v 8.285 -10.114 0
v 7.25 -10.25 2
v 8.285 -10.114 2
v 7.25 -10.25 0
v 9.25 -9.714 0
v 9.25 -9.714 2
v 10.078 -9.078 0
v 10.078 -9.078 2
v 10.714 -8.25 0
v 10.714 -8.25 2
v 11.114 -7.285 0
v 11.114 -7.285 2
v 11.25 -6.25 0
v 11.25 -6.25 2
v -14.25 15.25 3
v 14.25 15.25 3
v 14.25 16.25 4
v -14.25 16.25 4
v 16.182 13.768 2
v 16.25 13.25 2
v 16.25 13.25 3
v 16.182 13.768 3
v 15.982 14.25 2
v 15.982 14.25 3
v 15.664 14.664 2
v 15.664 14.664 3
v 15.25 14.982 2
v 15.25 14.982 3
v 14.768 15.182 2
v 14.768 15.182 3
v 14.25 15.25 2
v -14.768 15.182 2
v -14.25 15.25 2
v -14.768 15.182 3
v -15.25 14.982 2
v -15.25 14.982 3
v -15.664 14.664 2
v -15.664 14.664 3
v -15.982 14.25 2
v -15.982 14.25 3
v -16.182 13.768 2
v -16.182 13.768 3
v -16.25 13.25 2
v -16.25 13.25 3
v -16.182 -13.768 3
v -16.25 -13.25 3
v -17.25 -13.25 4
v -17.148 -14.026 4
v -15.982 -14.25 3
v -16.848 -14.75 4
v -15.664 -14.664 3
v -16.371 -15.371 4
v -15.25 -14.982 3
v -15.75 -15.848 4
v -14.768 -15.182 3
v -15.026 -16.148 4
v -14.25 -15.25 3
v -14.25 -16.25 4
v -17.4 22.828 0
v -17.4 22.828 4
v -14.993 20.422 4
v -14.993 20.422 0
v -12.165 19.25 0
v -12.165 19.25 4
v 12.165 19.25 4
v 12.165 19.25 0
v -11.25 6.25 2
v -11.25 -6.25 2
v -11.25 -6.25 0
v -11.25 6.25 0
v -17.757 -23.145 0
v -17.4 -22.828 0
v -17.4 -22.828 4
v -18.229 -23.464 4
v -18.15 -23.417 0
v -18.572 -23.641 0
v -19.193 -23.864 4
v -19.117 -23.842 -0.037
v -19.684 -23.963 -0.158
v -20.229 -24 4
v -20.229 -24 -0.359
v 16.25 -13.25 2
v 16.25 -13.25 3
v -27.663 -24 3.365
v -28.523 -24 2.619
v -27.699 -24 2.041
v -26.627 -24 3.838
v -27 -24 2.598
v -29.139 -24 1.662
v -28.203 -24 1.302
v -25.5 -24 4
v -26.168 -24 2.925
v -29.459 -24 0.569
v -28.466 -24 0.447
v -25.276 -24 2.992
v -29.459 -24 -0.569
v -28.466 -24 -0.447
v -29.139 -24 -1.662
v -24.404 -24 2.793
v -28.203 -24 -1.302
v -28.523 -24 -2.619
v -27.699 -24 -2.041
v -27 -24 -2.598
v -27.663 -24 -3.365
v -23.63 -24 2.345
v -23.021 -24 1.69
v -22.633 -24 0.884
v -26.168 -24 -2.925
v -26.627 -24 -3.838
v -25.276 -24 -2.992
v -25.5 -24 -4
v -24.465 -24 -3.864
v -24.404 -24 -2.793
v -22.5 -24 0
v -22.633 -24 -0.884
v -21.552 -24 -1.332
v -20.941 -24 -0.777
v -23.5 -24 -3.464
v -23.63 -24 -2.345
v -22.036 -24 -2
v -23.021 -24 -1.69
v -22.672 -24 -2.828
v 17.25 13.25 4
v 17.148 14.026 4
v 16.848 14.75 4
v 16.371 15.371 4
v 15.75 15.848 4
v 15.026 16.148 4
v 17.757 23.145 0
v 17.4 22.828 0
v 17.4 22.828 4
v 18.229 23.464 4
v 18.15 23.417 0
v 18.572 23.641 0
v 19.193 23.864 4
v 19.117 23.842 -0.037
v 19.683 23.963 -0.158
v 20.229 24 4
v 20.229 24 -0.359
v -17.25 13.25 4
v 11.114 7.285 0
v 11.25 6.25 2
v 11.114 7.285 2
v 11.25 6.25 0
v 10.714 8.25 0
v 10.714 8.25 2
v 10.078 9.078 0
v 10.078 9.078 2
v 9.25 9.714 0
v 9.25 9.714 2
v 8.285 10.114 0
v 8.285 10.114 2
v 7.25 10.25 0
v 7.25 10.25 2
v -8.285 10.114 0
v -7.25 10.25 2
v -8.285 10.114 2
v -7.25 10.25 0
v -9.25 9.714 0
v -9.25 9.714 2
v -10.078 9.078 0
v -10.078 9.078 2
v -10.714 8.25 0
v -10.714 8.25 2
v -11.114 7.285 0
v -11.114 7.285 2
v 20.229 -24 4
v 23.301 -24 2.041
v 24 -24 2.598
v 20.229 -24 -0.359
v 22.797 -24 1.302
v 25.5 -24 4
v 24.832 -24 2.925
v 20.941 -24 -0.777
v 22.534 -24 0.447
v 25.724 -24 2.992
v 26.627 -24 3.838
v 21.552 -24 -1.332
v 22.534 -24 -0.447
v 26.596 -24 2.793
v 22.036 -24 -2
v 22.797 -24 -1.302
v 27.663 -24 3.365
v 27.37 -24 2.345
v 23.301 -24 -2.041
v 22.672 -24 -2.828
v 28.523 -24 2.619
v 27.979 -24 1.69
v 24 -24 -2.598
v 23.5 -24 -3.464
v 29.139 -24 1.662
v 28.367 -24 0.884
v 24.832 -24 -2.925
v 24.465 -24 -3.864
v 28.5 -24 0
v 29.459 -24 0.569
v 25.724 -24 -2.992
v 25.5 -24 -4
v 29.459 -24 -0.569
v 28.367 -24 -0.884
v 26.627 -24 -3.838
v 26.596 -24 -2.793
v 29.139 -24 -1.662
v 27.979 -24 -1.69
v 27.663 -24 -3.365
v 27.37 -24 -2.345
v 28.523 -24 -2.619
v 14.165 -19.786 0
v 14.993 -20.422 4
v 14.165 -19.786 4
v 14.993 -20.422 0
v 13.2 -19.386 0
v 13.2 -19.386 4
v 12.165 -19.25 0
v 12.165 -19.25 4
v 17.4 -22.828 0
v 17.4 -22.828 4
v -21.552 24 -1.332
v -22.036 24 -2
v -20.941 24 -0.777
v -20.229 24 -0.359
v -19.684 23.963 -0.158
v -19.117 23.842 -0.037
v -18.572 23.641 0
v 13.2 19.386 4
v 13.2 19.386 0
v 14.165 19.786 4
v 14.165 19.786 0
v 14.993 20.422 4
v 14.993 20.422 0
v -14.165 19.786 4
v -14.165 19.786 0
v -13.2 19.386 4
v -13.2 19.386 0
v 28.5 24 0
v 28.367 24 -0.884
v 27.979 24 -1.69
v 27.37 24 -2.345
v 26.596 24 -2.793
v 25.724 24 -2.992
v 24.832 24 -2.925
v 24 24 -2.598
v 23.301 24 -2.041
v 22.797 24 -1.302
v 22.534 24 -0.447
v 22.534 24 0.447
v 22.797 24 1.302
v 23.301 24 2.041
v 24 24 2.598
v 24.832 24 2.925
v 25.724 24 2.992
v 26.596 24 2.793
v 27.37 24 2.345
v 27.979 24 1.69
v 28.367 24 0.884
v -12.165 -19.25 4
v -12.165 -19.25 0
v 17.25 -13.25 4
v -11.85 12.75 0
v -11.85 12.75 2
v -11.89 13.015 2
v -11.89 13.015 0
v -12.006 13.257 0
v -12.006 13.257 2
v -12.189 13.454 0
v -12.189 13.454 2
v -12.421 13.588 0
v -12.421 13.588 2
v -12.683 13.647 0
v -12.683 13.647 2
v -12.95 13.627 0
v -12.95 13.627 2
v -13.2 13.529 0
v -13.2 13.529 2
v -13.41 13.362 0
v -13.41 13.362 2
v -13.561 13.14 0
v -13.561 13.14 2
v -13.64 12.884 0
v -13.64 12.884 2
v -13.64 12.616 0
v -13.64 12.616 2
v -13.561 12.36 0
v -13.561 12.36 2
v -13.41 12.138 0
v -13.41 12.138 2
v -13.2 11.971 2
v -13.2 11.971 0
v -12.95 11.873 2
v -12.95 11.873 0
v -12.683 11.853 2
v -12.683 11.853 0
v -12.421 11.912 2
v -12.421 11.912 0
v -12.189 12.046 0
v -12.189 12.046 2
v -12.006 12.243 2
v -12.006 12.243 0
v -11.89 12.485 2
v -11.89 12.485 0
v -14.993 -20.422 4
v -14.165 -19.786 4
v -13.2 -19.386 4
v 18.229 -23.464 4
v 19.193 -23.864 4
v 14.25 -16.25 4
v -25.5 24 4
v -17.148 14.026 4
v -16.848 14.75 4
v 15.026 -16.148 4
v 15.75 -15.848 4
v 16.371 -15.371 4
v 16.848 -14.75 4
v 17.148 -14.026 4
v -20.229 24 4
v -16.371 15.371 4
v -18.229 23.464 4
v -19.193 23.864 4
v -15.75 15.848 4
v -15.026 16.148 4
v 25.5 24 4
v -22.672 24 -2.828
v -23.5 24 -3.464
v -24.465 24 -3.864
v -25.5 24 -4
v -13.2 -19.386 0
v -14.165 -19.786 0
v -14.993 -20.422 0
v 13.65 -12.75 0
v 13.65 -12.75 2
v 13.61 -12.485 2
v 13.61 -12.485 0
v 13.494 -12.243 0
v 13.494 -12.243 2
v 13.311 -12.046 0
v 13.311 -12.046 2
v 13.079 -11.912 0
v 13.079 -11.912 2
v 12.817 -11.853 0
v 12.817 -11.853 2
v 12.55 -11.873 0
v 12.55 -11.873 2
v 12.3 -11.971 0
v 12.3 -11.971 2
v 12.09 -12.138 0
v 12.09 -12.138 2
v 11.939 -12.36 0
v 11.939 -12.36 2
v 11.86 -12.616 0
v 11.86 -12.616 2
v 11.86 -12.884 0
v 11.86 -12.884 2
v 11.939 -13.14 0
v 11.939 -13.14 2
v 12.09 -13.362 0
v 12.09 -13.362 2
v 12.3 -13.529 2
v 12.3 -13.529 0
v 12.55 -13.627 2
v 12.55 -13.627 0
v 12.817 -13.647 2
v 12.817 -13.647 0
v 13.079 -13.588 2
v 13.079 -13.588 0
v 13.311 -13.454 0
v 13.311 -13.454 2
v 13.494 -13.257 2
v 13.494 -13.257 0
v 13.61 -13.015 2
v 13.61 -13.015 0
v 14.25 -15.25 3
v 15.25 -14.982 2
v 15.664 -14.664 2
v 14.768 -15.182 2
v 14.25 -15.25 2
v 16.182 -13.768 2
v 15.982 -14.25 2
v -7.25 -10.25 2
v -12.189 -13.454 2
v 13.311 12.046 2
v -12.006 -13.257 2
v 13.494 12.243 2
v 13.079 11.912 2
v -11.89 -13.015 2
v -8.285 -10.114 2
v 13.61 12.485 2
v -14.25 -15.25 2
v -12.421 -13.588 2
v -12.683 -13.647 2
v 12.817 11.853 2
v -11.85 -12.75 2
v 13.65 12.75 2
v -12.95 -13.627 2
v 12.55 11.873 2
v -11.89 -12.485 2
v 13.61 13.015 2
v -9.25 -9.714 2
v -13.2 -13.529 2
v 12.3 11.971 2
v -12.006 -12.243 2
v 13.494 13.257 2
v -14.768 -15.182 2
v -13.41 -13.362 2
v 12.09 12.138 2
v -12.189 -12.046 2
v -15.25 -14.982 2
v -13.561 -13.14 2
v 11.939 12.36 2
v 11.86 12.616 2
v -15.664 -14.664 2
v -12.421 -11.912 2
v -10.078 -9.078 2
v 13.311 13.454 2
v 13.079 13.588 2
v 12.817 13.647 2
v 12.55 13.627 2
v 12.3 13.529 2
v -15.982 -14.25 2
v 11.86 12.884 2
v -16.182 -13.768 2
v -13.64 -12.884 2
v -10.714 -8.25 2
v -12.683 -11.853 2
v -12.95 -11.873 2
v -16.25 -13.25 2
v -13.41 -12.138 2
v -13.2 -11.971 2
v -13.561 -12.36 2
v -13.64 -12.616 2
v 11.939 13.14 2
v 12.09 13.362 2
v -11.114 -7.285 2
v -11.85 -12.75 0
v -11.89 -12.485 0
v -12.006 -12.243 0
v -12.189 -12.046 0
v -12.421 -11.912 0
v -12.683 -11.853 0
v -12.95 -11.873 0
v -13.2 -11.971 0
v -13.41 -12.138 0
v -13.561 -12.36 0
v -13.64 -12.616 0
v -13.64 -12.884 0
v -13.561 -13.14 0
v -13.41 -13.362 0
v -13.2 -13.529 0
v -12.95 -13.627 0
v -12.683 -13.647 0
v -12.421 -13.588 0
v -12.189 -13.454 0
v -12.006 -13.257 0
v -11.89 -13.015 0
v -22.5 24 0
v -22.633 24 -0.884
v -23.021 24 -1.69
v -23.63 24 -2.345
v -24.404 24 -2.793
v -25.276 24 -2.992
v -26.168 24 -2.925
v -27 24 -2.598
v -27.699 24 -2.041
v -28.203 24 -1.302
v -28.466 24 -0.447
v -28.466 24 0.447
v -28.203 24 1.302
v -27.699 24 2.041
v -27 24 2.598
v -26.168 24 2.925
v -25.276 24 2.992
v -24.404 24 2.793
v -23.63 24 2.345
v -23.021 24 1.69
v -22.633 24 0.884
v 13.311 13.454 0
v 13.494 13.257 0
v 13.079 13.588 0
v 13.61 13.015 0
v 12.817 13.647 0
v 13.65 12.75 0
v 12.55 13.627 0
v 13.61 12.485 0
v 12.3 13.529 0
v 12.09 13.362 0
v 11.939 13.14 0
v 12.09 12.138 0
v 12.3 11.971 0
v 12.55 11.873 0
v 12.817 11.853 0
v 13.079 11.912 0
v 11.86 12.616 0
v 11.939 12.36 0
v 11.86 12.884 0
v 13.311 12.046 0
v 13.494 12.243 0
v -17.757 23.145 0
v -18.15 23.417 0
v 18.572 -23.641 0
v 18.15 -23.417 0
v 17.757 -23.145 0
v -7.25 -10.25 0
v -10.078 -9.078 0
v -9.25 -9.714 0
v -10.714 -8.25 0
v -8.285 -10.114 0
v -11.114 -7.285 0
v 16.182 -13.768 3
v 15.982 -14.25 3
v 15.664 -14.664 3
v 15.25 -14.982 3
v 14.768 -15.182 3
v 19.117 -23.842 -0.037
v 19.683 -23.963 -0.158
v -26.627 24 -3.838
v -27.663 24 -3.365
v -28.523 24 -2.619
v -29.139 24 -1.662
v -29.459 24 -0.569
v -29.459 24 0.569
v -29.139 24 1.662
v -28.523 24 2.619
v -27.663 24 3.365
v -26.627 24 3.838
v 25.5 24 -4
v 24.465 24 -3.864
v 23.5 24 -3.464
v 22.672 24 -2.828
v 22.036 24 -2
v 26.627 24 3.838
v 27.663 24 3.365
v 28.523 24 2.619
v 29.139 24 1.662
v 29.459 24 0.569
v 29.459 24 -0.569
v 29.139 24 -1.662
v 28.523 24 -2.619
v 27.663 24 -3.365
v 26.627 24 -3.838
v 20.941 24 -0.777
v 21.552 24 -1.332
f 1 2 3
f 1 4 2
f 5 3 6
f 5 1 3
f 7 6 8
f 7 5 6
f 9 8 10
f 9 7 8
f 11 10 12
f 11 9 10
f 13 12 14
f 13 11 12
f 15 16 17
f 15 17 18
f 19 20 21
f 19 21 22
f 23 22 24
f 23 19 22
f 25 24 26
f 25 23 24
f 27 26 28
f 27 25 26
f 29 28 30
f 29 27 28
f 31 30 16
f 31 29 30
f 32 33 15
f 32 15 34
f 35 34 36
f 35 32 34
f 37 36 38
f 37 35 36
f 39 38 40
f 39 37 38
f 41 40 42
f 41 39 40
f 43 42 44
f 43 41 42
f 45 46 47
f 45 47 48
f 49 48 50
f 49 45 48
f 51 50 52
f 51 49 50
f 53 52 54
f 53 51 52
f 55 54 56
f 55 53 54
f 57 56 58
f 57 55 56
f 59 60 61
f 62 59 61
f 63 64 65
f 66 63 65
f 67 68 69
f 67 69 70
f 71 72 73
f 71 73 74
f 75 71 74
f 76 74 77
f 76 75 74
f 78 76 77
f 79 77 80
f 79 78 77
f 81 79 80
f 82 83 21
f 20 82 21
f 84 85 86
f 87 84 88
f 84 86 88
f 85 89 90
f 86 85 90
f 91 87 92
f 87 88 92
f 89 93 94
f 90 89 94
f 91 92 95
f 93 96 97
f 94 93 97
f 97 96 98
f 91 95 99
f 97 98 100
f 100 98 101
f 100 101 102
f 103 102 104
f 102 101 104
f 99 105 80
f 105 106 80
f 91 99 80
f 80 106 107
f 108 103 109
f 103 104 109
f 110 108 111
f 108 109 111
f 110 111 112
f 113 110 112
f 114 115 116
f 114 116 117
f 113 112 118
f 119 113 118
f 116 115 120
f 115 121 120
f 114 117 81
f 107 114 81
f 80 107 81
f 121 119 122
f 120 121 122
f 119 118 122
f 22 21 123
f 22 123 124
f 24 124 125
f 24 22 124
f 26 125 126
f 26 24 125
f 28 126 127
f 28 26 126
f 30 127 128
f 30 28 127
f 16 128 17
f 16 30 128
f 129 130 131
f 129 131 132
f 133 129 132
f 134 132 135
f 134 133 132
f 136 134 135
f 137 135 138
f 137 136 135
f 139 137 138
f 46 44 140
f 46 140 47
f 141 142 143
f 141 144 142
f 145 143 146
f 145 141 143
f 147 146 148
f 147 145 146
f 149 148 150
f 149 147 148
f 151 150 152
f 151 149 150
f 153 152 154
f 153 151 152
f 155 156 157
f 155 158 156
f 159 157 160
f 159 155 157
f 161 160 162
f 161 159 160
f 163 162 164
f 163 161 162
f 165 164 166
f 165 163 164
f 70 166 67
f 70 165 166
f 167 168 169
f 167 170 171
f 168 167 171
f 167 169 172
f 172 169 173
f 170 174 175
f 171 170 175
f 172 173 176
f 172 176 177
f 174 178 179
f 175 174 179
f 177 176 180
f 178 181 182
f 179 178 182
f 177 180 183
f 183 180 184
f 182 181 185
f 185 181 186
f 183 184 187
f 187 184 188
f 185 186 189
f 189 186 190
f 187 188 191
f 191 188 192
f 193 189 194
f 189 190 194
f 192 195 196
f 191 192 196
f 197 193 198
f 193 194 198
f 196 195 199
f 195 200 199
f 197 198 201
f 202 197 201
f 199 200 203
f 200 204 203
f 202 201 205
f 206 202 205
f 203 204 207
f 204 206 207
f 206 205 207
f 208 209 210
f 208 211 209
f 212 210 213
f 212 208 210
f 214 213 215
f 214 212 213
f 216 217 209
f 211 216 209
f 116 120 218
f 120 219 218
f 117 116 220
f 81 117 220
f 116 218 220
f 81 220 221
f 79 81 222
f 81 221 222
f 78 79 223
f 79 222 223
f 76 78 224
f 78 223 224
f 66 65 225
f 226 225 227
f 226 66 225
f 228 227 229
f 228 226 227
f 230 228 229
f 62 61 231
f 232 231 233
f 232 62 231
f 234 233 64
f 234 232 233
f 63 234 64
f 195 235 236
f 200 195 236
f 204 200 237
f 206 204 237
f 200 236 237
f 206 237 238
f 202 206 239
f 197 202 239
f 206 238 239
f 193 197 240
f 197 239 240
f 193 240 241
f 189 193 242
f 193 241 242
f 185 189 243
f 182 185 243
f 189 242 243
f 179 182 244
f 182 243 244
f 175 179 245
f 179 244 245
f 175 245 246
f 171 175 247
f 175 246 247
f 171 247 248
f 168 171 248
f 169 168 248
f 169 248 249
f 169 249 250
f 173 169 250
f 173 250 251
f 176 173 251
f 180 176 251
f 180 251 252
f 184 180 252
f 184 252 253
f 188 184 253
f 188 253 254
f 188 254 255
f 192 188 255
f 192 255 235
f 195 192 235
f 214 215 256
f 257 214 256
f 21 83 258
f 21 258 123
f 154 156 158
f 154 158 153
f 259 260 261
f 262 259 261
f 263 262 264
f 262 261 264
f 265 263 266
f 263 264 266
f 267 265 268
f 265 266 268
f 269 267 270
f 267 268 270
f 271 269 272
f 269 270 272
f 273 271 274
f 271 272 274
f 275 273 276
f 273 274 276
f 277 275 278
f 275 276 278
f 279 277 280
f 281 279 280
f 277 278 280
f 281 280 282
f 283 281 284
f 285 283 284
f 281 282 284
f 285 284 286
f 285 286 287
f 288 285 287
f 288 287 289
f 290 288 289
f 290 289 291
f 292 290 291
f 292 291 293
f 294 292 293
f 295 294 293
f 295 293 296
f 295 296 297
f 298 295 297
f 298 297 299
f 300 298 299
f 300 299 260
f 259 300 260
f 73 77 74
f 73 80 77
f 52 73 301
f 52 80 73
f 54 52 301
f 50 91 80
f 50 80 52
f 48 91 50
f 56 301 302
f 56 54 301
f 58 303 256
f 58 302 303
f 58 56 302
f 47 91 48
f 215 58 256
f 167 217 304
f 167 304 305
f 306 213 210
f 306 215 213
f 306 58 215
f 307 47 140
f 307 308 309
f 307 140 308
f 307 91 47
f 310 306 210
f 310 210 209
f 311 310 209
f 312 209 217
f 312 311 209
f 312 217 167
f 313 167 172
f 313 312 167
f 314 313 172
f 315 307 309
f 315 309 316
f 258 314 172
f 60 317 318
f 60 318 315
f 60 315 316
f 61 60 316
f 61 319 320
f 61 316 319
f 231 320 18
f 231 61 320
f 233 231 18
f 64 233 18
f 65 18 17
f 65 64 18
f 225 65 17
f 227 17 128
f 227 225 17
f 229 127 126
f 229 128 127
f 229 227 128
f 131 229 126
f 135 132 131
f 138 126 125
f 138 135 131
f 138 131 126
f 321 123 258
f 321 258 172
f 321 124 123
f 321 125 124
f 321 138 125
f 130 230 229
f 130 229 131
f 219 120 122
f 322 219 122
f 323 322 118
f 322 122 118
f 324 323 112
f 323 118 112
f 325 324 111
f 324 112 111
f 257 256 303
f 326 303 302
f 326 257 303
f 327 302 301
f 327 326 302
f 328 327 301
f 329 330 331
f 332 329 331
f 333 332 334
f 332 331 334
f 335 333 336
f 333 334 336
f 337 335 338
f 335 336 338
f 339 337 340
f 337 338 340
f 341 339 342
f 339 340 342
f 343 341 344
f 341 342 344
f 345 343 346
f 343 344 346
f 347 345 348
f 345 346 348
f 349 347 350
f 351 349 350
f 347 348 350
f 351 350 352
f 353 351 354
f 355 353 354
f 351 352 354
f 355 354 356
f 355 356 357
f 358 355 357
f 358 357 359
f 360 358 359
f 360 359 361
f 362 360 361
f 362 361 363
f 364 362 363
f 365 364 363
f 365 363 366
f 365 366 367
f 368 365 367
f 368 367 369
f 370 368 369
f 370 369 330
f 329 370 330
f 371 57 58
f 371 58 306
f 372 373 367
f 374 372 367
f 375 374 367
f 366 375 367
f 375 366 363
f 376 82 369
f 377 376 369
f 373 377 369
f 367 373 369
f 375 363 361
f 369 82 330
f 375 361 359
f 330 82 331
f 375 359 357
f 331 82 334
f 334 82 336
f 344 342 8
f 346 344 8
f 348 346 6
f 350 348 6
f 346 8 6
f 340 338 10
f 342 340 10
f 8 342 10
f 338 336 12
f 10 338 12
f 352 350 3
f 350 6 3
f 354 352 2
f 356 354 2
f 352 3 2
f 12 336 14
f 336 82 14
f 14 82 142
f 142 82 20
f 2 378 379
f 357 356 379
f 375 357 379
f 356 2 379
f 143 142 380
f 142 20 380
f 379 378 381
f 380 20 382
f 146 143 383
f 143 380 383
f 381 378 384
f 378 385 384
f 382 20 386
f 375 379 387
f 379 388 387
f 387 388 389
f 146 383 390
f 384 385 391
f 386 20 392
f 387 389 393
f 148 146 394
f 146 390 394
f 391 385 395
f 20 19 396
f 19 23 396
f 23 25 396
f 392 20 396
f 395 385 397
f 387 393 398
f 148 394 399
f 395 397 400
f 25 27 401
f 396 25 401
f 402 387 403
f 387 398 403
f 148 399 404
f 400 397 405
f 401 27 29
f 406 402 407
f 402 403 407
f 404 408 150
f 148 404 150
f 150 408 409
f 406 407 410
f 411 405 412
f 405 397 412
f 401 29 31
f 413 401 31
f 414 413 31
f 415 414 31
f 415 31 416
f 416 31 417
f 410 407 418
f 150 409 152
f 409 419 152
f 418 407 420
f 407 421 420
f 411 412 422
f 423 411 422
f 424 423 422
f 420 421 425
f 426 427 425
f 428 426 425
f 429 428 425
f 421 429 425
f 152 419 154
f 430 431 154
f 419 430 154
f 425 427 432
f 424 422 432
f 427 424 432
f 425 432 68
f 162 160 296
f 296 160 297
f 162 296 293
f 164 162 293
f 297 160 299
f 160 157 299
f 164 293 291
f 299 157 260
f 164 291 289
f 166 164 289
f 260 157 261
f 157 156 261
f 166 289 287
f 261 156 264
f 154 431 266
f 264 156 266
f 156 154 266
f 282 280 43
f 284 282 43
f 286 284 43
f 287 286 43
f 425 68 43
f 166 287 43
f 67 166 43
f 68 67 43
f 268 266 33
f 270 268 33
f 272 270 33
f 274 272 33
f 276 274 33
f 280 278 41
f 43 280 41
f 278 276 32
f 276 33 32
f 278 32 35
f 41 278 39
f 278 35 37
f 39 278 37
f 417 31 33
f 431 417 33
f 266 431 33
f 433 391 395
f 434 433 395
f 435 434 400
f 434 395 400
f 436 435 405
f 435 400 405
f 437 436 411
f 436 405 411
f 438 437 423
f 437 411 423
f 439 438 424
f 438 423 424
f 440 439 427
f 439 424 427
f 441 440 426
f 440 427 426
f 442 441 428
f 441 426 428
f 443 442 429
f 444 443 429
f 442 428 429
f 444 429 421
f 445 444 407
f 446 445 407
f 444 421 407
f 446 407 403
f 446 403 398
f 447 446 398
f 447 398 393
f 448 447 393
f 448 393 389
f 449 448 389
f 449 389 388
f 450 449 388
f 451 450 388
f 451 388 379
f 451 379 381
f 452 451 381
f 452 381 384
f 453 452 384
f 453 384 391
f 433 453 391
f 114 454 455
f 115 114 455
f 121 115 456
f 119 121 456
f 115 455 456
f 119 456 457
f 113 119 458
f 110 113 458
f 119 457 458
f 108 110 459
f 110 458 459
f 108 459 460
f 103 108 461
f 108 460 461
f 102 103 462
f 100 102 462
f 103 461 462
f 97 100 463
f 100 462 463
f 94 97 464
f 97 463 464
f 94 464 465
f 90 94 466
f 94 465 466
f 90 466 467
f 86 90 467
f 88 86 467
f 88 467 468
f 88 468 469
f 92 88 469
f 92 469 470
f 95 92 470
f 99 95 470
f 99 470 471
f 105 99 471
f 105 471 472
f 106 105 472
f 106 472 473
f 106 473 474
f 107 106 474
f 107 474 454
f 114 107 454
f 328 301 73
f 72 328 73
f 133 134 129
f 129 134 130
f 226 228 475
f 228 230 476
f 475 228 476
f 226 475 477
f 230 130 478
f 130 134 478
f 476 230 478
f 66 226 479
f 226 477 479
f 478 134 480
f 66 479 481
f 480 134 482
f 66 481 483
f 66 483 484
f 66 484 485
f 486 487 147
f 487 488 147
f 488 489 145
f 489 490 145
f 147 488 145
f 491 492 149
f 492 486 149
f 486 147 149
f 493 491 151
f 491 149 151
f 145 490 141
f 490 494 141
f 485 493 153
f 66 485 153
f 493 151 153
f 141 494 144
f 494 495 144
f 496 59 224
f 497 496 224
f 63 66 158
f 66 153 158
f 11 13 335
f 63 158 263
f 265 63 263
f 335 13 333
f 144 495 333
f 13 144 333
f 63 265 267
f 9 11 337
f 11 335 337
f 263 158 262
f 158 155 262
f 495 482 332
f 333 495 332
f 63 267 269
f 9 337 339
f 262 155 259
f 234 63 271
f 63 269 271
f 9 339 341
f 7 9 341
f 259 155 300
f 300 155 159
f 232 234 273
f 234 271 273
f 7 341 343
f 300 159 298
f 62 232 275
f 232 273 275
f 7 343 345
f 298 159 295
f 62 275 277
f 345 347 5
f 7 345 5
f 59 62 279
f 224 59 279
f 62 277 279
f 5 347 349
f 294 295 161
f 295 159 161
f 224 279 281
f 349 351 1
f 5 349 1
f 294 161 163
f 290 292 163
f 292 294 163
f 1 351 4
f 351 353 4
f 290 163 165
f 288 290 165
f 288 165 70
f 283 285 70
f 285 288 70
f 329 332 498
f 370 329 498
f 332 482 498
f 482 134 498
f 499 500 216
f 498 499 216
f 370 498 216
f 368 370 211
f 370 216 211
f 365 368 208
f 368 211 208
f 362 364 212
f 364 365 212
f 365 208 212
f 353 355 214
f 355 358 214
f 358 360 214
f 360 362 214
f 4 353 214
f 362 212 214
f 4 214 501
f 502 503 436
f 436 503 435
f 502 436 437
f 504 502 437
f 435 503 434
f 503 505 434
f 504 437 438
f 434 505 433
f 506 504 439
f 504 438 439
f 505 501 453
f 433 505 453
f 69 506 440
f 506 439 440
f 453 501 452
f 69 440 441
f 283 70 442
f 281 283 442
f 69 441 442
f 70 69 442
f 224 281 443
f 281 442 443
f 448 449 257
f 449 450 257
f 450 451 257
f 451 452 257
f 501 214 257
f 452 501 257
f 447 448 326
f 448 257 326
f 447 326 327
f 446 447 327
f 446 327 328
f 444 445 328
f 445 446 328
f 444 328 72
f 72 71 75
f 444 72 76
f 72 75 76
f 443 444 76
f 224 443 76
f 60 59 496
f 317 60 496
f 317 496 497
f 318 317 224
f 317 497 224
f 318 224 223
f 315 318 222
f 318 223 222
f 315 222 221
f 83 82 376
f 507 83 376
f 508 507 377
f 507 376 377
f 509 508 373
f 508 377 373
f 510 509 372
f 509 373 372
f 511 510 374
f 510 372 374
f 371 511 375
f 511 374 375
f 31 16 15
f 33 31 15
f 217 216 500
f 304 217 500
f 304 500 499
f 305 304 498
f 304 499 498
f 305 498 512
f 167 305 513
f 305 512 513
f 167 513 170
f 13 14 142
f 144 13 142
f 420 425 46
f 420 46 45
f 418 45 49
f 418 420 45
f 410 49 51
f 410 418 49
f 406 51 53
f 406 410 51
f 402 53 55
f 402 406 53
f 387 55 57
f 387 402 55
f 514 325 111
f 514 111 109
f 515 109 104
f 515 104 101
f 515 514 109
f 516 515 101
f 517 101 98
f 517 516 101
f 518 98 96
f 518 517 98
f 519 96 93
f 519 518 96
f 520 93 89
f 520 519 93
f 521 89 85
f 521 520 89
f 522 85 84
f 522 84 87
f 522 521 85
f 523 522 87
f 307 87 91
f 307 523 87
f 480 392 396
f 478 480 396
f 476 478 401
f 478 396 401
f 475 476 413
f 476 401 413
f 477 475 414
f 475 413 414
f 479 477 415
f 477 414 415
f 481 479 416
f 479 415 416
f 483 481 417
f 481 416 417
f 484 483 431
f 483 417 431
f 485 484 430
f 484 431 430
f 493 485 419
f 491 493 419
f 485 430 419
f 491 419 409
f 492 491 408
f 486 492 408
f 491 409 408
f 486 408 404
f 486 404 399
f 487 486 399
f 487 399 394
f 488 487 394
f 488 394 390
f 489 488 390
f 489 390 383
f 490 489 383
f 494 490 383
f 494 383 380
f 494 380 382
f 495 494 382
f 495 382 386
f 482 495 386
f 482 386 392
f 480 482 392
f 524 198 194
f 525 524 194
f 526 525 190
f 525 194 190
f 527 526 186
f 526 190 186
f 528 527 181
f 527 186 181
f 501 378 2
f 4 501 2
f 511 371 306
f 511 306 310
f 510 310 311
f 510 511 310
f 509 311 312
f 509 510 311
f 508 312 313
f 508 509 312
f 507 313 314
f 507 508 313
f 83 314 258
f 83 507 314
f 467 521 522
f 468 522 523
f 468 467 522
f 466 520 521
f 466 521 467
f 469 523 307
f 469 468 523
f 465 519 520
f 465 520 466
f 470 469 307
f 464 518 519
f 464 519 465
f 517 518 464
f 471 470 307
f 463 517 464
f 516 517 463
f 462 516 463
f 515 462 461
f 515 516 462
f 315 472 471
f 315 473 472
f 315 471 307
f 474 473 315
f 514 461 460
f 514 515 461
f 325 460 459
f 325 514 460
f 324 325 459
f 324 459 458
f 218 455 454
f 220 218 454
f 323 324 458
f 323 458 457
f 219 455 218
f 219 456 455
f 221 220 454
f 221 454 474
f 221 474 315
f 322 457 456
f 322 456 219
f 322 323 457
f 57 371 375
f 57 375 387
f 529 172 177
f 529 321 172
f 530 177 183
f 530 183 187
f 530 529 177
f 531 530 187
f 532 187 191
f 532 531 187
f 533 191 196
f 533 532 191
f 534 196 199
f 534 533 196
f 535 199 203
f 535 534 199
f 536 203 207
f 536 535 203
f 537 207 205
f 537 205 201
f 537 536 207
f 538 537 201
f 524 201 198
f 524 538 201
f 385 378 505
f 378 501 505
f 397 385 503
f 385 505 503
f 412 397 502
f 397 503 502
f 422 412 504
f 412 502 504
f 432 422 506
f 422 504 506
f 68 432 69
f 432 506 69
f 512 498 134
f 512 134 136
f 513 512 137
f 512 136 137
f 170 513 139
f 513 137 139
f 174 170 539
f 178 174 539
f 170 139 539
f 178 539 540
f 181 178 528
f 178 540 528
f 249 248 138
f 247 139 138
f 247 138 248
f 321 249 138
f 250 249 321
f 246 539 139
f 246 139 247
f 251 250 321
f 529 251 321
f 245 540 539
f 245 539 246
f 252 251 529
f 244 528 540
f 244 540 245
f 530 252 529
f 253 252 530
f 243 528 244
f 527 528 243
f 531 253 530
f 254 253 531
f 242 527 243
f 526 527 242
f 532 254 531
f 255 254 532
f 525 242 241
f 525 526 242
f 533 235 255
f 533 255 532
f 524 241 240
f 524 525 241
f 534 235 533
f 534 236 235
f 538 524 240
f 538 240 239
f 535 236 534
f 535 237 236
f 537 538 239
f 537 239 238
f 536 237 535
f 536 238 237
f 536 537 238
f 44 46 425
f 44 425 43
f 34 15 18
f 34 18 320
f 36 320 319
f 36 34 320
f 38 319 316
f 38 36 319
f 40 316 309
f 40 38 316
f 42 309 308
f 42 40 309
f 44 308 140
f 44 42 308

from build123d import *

# Parameters (mm, degrees)
BOSS_EXTRUDE1_DEPTH    = 24
F_6_0MM_DOWEL_HOLE1_D  = 6
SKETCH4_W              = 32.5
SKETCH4_H              = 30.5
CUT_EXTRUDE1_DEPTH     = 2
FILLET1_R              = 2
CUT_EXTRUDE2_DEPTH     = 57.482298112
FILLET2_R              = 4
SKETCH6_W              = 22.5
SKETCH6_H              = 20.5
CUT_EXTRUDE5_DEPTH     = 39.861935104
FILLET3_R              = 4
CUT_EXTRUDE6_DEPTH     = 39.861935104
FILLET4_R              = 4
M1_6_CLEARANCE_HOLE1_D = 1.8
CHAMFER1_SIZE          = 1


with BuildPart() as part:
    # Sketch1 → Boss-Extrude1 (new, symmetric)
    with BuildSketch(Plane(origin=(0, 0, 0), x_dir=(1, 0, 0), z_dir=(0, 1, 0))):
        with BuildLine():
            Line((25.5, 4), (-25.5, 4))
            ThreePointArc((-25.5, 4), (-29.5, 0), (-25.5, -4))
            Line((-25.5, -4), (25.5, -4))
            ThreePointArc((25.5, -4), (29.5, 0), (25.5, 4))
        make_face()
    extrude(amount=BOSS_EXTRUDE1_DEPTH, both=True)

    # Ø6.0mm Dowel Hole1 (through all)
    with Locations(Plane(origin=(0, -24, 0), x_dir=(-1, 0, 0), z_dir=(0, -1, 0))):
        with Locations((25.5, 0), (-25.5, 0)):
            Hole(F_6_0MM_DOWEL_HOLE1_D / 2)

    # Sketch4 → Cut-Extrude1 (cut)
    with BuildSketch(Plane(origin=(0, 0, 4), x_dir=(-1, 0, 0), z_dir=(0, 0, -1))):
        Rectangle(SKETCH4_W, SKETCH4_H)
    extrude(amount=CUT_EXTRUDE1_DEPTH, mode=Mode.SUBTRACT)

    # Fillet1
    fillet1_edges = [part.edges().sort_by_distance(p)[0] for p in [
        (-16.25, 15.25, 3),
        (16.25, 15.25, 3),
        (16.25, -15.25, 3),
        (-16.25, -15.25, 3),
    ]]
    fillet(fillet1_edges, radius=FILLET1_R)

    # Sketch5 → Cut-Extrude2 (cut, through all)
    with BuildSketch(Plane.XZ.offset(24)):
        with BuildLine():
            Line((21.5, 0), (-21.5, 0))
            ThreePointArc((-21.5, 0), (-22.671572875, -2.828427125), (-25.5, -4))
            Line((-25.5, -4), (25.5, -4))
            ThreePointArc((25.5, -4), (22.671572875, -2.828427125), (21.5, 0))
        make_face()
    extrude(amount=-CUT_EXTRUDE2_DEPTH, mode=Mode.SUBTRACT)

    # Fillet2
    fillet2_edges = [part.edges().sort_by_distance(p)[0] for p in [
        (21.5, 0, 0),
        (-21.5, 0, 0),
    ]]
    fillet(fillet2_edges, radius=FILLET2_R)

    # Sketch6 → Cut-Extrude5 (cut, through all)
    with BuildSketch(Plane.XY.offset(4)):
        Rectangle(SKETCH6_W, SKETCH6_H)
    extrude(amount=-CUT_EXTRUDE5_DEPTH, mode=Mode.SUBTRACT)

    # Fillet3
    fillet3_edges = [part.edges().sort_by_distance(p)[0] for p in [
        (11.25, -10.25, 1),
        (-11.25, -10.25, 1),
        (-11.25, 10.25, 1),
        (11.25, 10.25, 1),
    ]]
    fillet(fillet3_edges, radius=FILLET3_R)

    # Sketch7 → Cut-Extrude6 (cut, through all)
    with BuildSketch(Plane.XY.offset(4)):
        Polygon((18.57179677, 24), (-18.57179677, 24), (-13.82179677, 19.25), (13.82179677, 19.25), align=None)
        Polygon((-18.57179677, -24), (18.57179677, -24), (13.82179677, -19.25), (-13.82179677, -19.25), align=None)
    extrude(amount=-CUT_EXTRUDE6_DEPTH, mode=Mode.SUBTRACT)

    # Fillet4
    fillet4_edges = [part.edges().sort_by_distance(p)[0] for p in [
        (18.57179677, 24, 2),
        (13.82179677, 19.25, 2),
        (-13.82179677, 19.25, 2),
        (-18.57179677, 24, 2),
        (-18.57179677, -24, 2),
        (-13.82179677, -19.25, 2),
        (13.82179677, -19.25, 2),
        (18.57179677, -24, 2),
    ]]
    fillet(fillet4_edges, radius=FILLET4_R)

    # M1.6 Clearance Hole1 (through all)
    with Locations(Plane(origin=(0, 0, 0), x_dir=(-1, 0, 0), z_dir=(0, 0, -1))):
        with Locations((12.75, 12.75), (-12.75, 12.75), (-12.75, -12.75), (12.75, -12.75)):
            Hole(M1_6_CLEARANCE_HOLE1_D / 2)

    # Chamfer1
    chamfer1_edges = [part.edges().sort_by_distance(p)[0] for p in [
        (16.25, 0, 4),
        (0, -15.25, 4),
        (-16.25, 0, 4),
        (0, 15.25, 4),
        (15.664213562, -14.664213562, 4),
        (-15.664213562, 14.664213562, 4),
        (15.664213562, 14.664213562, 4),
        (-15.664213562, -14.664213562, 4),
    ]]
    chamfer(chamfer1_edges, length=CHAMFER1_SIZE)


solid = part.part
